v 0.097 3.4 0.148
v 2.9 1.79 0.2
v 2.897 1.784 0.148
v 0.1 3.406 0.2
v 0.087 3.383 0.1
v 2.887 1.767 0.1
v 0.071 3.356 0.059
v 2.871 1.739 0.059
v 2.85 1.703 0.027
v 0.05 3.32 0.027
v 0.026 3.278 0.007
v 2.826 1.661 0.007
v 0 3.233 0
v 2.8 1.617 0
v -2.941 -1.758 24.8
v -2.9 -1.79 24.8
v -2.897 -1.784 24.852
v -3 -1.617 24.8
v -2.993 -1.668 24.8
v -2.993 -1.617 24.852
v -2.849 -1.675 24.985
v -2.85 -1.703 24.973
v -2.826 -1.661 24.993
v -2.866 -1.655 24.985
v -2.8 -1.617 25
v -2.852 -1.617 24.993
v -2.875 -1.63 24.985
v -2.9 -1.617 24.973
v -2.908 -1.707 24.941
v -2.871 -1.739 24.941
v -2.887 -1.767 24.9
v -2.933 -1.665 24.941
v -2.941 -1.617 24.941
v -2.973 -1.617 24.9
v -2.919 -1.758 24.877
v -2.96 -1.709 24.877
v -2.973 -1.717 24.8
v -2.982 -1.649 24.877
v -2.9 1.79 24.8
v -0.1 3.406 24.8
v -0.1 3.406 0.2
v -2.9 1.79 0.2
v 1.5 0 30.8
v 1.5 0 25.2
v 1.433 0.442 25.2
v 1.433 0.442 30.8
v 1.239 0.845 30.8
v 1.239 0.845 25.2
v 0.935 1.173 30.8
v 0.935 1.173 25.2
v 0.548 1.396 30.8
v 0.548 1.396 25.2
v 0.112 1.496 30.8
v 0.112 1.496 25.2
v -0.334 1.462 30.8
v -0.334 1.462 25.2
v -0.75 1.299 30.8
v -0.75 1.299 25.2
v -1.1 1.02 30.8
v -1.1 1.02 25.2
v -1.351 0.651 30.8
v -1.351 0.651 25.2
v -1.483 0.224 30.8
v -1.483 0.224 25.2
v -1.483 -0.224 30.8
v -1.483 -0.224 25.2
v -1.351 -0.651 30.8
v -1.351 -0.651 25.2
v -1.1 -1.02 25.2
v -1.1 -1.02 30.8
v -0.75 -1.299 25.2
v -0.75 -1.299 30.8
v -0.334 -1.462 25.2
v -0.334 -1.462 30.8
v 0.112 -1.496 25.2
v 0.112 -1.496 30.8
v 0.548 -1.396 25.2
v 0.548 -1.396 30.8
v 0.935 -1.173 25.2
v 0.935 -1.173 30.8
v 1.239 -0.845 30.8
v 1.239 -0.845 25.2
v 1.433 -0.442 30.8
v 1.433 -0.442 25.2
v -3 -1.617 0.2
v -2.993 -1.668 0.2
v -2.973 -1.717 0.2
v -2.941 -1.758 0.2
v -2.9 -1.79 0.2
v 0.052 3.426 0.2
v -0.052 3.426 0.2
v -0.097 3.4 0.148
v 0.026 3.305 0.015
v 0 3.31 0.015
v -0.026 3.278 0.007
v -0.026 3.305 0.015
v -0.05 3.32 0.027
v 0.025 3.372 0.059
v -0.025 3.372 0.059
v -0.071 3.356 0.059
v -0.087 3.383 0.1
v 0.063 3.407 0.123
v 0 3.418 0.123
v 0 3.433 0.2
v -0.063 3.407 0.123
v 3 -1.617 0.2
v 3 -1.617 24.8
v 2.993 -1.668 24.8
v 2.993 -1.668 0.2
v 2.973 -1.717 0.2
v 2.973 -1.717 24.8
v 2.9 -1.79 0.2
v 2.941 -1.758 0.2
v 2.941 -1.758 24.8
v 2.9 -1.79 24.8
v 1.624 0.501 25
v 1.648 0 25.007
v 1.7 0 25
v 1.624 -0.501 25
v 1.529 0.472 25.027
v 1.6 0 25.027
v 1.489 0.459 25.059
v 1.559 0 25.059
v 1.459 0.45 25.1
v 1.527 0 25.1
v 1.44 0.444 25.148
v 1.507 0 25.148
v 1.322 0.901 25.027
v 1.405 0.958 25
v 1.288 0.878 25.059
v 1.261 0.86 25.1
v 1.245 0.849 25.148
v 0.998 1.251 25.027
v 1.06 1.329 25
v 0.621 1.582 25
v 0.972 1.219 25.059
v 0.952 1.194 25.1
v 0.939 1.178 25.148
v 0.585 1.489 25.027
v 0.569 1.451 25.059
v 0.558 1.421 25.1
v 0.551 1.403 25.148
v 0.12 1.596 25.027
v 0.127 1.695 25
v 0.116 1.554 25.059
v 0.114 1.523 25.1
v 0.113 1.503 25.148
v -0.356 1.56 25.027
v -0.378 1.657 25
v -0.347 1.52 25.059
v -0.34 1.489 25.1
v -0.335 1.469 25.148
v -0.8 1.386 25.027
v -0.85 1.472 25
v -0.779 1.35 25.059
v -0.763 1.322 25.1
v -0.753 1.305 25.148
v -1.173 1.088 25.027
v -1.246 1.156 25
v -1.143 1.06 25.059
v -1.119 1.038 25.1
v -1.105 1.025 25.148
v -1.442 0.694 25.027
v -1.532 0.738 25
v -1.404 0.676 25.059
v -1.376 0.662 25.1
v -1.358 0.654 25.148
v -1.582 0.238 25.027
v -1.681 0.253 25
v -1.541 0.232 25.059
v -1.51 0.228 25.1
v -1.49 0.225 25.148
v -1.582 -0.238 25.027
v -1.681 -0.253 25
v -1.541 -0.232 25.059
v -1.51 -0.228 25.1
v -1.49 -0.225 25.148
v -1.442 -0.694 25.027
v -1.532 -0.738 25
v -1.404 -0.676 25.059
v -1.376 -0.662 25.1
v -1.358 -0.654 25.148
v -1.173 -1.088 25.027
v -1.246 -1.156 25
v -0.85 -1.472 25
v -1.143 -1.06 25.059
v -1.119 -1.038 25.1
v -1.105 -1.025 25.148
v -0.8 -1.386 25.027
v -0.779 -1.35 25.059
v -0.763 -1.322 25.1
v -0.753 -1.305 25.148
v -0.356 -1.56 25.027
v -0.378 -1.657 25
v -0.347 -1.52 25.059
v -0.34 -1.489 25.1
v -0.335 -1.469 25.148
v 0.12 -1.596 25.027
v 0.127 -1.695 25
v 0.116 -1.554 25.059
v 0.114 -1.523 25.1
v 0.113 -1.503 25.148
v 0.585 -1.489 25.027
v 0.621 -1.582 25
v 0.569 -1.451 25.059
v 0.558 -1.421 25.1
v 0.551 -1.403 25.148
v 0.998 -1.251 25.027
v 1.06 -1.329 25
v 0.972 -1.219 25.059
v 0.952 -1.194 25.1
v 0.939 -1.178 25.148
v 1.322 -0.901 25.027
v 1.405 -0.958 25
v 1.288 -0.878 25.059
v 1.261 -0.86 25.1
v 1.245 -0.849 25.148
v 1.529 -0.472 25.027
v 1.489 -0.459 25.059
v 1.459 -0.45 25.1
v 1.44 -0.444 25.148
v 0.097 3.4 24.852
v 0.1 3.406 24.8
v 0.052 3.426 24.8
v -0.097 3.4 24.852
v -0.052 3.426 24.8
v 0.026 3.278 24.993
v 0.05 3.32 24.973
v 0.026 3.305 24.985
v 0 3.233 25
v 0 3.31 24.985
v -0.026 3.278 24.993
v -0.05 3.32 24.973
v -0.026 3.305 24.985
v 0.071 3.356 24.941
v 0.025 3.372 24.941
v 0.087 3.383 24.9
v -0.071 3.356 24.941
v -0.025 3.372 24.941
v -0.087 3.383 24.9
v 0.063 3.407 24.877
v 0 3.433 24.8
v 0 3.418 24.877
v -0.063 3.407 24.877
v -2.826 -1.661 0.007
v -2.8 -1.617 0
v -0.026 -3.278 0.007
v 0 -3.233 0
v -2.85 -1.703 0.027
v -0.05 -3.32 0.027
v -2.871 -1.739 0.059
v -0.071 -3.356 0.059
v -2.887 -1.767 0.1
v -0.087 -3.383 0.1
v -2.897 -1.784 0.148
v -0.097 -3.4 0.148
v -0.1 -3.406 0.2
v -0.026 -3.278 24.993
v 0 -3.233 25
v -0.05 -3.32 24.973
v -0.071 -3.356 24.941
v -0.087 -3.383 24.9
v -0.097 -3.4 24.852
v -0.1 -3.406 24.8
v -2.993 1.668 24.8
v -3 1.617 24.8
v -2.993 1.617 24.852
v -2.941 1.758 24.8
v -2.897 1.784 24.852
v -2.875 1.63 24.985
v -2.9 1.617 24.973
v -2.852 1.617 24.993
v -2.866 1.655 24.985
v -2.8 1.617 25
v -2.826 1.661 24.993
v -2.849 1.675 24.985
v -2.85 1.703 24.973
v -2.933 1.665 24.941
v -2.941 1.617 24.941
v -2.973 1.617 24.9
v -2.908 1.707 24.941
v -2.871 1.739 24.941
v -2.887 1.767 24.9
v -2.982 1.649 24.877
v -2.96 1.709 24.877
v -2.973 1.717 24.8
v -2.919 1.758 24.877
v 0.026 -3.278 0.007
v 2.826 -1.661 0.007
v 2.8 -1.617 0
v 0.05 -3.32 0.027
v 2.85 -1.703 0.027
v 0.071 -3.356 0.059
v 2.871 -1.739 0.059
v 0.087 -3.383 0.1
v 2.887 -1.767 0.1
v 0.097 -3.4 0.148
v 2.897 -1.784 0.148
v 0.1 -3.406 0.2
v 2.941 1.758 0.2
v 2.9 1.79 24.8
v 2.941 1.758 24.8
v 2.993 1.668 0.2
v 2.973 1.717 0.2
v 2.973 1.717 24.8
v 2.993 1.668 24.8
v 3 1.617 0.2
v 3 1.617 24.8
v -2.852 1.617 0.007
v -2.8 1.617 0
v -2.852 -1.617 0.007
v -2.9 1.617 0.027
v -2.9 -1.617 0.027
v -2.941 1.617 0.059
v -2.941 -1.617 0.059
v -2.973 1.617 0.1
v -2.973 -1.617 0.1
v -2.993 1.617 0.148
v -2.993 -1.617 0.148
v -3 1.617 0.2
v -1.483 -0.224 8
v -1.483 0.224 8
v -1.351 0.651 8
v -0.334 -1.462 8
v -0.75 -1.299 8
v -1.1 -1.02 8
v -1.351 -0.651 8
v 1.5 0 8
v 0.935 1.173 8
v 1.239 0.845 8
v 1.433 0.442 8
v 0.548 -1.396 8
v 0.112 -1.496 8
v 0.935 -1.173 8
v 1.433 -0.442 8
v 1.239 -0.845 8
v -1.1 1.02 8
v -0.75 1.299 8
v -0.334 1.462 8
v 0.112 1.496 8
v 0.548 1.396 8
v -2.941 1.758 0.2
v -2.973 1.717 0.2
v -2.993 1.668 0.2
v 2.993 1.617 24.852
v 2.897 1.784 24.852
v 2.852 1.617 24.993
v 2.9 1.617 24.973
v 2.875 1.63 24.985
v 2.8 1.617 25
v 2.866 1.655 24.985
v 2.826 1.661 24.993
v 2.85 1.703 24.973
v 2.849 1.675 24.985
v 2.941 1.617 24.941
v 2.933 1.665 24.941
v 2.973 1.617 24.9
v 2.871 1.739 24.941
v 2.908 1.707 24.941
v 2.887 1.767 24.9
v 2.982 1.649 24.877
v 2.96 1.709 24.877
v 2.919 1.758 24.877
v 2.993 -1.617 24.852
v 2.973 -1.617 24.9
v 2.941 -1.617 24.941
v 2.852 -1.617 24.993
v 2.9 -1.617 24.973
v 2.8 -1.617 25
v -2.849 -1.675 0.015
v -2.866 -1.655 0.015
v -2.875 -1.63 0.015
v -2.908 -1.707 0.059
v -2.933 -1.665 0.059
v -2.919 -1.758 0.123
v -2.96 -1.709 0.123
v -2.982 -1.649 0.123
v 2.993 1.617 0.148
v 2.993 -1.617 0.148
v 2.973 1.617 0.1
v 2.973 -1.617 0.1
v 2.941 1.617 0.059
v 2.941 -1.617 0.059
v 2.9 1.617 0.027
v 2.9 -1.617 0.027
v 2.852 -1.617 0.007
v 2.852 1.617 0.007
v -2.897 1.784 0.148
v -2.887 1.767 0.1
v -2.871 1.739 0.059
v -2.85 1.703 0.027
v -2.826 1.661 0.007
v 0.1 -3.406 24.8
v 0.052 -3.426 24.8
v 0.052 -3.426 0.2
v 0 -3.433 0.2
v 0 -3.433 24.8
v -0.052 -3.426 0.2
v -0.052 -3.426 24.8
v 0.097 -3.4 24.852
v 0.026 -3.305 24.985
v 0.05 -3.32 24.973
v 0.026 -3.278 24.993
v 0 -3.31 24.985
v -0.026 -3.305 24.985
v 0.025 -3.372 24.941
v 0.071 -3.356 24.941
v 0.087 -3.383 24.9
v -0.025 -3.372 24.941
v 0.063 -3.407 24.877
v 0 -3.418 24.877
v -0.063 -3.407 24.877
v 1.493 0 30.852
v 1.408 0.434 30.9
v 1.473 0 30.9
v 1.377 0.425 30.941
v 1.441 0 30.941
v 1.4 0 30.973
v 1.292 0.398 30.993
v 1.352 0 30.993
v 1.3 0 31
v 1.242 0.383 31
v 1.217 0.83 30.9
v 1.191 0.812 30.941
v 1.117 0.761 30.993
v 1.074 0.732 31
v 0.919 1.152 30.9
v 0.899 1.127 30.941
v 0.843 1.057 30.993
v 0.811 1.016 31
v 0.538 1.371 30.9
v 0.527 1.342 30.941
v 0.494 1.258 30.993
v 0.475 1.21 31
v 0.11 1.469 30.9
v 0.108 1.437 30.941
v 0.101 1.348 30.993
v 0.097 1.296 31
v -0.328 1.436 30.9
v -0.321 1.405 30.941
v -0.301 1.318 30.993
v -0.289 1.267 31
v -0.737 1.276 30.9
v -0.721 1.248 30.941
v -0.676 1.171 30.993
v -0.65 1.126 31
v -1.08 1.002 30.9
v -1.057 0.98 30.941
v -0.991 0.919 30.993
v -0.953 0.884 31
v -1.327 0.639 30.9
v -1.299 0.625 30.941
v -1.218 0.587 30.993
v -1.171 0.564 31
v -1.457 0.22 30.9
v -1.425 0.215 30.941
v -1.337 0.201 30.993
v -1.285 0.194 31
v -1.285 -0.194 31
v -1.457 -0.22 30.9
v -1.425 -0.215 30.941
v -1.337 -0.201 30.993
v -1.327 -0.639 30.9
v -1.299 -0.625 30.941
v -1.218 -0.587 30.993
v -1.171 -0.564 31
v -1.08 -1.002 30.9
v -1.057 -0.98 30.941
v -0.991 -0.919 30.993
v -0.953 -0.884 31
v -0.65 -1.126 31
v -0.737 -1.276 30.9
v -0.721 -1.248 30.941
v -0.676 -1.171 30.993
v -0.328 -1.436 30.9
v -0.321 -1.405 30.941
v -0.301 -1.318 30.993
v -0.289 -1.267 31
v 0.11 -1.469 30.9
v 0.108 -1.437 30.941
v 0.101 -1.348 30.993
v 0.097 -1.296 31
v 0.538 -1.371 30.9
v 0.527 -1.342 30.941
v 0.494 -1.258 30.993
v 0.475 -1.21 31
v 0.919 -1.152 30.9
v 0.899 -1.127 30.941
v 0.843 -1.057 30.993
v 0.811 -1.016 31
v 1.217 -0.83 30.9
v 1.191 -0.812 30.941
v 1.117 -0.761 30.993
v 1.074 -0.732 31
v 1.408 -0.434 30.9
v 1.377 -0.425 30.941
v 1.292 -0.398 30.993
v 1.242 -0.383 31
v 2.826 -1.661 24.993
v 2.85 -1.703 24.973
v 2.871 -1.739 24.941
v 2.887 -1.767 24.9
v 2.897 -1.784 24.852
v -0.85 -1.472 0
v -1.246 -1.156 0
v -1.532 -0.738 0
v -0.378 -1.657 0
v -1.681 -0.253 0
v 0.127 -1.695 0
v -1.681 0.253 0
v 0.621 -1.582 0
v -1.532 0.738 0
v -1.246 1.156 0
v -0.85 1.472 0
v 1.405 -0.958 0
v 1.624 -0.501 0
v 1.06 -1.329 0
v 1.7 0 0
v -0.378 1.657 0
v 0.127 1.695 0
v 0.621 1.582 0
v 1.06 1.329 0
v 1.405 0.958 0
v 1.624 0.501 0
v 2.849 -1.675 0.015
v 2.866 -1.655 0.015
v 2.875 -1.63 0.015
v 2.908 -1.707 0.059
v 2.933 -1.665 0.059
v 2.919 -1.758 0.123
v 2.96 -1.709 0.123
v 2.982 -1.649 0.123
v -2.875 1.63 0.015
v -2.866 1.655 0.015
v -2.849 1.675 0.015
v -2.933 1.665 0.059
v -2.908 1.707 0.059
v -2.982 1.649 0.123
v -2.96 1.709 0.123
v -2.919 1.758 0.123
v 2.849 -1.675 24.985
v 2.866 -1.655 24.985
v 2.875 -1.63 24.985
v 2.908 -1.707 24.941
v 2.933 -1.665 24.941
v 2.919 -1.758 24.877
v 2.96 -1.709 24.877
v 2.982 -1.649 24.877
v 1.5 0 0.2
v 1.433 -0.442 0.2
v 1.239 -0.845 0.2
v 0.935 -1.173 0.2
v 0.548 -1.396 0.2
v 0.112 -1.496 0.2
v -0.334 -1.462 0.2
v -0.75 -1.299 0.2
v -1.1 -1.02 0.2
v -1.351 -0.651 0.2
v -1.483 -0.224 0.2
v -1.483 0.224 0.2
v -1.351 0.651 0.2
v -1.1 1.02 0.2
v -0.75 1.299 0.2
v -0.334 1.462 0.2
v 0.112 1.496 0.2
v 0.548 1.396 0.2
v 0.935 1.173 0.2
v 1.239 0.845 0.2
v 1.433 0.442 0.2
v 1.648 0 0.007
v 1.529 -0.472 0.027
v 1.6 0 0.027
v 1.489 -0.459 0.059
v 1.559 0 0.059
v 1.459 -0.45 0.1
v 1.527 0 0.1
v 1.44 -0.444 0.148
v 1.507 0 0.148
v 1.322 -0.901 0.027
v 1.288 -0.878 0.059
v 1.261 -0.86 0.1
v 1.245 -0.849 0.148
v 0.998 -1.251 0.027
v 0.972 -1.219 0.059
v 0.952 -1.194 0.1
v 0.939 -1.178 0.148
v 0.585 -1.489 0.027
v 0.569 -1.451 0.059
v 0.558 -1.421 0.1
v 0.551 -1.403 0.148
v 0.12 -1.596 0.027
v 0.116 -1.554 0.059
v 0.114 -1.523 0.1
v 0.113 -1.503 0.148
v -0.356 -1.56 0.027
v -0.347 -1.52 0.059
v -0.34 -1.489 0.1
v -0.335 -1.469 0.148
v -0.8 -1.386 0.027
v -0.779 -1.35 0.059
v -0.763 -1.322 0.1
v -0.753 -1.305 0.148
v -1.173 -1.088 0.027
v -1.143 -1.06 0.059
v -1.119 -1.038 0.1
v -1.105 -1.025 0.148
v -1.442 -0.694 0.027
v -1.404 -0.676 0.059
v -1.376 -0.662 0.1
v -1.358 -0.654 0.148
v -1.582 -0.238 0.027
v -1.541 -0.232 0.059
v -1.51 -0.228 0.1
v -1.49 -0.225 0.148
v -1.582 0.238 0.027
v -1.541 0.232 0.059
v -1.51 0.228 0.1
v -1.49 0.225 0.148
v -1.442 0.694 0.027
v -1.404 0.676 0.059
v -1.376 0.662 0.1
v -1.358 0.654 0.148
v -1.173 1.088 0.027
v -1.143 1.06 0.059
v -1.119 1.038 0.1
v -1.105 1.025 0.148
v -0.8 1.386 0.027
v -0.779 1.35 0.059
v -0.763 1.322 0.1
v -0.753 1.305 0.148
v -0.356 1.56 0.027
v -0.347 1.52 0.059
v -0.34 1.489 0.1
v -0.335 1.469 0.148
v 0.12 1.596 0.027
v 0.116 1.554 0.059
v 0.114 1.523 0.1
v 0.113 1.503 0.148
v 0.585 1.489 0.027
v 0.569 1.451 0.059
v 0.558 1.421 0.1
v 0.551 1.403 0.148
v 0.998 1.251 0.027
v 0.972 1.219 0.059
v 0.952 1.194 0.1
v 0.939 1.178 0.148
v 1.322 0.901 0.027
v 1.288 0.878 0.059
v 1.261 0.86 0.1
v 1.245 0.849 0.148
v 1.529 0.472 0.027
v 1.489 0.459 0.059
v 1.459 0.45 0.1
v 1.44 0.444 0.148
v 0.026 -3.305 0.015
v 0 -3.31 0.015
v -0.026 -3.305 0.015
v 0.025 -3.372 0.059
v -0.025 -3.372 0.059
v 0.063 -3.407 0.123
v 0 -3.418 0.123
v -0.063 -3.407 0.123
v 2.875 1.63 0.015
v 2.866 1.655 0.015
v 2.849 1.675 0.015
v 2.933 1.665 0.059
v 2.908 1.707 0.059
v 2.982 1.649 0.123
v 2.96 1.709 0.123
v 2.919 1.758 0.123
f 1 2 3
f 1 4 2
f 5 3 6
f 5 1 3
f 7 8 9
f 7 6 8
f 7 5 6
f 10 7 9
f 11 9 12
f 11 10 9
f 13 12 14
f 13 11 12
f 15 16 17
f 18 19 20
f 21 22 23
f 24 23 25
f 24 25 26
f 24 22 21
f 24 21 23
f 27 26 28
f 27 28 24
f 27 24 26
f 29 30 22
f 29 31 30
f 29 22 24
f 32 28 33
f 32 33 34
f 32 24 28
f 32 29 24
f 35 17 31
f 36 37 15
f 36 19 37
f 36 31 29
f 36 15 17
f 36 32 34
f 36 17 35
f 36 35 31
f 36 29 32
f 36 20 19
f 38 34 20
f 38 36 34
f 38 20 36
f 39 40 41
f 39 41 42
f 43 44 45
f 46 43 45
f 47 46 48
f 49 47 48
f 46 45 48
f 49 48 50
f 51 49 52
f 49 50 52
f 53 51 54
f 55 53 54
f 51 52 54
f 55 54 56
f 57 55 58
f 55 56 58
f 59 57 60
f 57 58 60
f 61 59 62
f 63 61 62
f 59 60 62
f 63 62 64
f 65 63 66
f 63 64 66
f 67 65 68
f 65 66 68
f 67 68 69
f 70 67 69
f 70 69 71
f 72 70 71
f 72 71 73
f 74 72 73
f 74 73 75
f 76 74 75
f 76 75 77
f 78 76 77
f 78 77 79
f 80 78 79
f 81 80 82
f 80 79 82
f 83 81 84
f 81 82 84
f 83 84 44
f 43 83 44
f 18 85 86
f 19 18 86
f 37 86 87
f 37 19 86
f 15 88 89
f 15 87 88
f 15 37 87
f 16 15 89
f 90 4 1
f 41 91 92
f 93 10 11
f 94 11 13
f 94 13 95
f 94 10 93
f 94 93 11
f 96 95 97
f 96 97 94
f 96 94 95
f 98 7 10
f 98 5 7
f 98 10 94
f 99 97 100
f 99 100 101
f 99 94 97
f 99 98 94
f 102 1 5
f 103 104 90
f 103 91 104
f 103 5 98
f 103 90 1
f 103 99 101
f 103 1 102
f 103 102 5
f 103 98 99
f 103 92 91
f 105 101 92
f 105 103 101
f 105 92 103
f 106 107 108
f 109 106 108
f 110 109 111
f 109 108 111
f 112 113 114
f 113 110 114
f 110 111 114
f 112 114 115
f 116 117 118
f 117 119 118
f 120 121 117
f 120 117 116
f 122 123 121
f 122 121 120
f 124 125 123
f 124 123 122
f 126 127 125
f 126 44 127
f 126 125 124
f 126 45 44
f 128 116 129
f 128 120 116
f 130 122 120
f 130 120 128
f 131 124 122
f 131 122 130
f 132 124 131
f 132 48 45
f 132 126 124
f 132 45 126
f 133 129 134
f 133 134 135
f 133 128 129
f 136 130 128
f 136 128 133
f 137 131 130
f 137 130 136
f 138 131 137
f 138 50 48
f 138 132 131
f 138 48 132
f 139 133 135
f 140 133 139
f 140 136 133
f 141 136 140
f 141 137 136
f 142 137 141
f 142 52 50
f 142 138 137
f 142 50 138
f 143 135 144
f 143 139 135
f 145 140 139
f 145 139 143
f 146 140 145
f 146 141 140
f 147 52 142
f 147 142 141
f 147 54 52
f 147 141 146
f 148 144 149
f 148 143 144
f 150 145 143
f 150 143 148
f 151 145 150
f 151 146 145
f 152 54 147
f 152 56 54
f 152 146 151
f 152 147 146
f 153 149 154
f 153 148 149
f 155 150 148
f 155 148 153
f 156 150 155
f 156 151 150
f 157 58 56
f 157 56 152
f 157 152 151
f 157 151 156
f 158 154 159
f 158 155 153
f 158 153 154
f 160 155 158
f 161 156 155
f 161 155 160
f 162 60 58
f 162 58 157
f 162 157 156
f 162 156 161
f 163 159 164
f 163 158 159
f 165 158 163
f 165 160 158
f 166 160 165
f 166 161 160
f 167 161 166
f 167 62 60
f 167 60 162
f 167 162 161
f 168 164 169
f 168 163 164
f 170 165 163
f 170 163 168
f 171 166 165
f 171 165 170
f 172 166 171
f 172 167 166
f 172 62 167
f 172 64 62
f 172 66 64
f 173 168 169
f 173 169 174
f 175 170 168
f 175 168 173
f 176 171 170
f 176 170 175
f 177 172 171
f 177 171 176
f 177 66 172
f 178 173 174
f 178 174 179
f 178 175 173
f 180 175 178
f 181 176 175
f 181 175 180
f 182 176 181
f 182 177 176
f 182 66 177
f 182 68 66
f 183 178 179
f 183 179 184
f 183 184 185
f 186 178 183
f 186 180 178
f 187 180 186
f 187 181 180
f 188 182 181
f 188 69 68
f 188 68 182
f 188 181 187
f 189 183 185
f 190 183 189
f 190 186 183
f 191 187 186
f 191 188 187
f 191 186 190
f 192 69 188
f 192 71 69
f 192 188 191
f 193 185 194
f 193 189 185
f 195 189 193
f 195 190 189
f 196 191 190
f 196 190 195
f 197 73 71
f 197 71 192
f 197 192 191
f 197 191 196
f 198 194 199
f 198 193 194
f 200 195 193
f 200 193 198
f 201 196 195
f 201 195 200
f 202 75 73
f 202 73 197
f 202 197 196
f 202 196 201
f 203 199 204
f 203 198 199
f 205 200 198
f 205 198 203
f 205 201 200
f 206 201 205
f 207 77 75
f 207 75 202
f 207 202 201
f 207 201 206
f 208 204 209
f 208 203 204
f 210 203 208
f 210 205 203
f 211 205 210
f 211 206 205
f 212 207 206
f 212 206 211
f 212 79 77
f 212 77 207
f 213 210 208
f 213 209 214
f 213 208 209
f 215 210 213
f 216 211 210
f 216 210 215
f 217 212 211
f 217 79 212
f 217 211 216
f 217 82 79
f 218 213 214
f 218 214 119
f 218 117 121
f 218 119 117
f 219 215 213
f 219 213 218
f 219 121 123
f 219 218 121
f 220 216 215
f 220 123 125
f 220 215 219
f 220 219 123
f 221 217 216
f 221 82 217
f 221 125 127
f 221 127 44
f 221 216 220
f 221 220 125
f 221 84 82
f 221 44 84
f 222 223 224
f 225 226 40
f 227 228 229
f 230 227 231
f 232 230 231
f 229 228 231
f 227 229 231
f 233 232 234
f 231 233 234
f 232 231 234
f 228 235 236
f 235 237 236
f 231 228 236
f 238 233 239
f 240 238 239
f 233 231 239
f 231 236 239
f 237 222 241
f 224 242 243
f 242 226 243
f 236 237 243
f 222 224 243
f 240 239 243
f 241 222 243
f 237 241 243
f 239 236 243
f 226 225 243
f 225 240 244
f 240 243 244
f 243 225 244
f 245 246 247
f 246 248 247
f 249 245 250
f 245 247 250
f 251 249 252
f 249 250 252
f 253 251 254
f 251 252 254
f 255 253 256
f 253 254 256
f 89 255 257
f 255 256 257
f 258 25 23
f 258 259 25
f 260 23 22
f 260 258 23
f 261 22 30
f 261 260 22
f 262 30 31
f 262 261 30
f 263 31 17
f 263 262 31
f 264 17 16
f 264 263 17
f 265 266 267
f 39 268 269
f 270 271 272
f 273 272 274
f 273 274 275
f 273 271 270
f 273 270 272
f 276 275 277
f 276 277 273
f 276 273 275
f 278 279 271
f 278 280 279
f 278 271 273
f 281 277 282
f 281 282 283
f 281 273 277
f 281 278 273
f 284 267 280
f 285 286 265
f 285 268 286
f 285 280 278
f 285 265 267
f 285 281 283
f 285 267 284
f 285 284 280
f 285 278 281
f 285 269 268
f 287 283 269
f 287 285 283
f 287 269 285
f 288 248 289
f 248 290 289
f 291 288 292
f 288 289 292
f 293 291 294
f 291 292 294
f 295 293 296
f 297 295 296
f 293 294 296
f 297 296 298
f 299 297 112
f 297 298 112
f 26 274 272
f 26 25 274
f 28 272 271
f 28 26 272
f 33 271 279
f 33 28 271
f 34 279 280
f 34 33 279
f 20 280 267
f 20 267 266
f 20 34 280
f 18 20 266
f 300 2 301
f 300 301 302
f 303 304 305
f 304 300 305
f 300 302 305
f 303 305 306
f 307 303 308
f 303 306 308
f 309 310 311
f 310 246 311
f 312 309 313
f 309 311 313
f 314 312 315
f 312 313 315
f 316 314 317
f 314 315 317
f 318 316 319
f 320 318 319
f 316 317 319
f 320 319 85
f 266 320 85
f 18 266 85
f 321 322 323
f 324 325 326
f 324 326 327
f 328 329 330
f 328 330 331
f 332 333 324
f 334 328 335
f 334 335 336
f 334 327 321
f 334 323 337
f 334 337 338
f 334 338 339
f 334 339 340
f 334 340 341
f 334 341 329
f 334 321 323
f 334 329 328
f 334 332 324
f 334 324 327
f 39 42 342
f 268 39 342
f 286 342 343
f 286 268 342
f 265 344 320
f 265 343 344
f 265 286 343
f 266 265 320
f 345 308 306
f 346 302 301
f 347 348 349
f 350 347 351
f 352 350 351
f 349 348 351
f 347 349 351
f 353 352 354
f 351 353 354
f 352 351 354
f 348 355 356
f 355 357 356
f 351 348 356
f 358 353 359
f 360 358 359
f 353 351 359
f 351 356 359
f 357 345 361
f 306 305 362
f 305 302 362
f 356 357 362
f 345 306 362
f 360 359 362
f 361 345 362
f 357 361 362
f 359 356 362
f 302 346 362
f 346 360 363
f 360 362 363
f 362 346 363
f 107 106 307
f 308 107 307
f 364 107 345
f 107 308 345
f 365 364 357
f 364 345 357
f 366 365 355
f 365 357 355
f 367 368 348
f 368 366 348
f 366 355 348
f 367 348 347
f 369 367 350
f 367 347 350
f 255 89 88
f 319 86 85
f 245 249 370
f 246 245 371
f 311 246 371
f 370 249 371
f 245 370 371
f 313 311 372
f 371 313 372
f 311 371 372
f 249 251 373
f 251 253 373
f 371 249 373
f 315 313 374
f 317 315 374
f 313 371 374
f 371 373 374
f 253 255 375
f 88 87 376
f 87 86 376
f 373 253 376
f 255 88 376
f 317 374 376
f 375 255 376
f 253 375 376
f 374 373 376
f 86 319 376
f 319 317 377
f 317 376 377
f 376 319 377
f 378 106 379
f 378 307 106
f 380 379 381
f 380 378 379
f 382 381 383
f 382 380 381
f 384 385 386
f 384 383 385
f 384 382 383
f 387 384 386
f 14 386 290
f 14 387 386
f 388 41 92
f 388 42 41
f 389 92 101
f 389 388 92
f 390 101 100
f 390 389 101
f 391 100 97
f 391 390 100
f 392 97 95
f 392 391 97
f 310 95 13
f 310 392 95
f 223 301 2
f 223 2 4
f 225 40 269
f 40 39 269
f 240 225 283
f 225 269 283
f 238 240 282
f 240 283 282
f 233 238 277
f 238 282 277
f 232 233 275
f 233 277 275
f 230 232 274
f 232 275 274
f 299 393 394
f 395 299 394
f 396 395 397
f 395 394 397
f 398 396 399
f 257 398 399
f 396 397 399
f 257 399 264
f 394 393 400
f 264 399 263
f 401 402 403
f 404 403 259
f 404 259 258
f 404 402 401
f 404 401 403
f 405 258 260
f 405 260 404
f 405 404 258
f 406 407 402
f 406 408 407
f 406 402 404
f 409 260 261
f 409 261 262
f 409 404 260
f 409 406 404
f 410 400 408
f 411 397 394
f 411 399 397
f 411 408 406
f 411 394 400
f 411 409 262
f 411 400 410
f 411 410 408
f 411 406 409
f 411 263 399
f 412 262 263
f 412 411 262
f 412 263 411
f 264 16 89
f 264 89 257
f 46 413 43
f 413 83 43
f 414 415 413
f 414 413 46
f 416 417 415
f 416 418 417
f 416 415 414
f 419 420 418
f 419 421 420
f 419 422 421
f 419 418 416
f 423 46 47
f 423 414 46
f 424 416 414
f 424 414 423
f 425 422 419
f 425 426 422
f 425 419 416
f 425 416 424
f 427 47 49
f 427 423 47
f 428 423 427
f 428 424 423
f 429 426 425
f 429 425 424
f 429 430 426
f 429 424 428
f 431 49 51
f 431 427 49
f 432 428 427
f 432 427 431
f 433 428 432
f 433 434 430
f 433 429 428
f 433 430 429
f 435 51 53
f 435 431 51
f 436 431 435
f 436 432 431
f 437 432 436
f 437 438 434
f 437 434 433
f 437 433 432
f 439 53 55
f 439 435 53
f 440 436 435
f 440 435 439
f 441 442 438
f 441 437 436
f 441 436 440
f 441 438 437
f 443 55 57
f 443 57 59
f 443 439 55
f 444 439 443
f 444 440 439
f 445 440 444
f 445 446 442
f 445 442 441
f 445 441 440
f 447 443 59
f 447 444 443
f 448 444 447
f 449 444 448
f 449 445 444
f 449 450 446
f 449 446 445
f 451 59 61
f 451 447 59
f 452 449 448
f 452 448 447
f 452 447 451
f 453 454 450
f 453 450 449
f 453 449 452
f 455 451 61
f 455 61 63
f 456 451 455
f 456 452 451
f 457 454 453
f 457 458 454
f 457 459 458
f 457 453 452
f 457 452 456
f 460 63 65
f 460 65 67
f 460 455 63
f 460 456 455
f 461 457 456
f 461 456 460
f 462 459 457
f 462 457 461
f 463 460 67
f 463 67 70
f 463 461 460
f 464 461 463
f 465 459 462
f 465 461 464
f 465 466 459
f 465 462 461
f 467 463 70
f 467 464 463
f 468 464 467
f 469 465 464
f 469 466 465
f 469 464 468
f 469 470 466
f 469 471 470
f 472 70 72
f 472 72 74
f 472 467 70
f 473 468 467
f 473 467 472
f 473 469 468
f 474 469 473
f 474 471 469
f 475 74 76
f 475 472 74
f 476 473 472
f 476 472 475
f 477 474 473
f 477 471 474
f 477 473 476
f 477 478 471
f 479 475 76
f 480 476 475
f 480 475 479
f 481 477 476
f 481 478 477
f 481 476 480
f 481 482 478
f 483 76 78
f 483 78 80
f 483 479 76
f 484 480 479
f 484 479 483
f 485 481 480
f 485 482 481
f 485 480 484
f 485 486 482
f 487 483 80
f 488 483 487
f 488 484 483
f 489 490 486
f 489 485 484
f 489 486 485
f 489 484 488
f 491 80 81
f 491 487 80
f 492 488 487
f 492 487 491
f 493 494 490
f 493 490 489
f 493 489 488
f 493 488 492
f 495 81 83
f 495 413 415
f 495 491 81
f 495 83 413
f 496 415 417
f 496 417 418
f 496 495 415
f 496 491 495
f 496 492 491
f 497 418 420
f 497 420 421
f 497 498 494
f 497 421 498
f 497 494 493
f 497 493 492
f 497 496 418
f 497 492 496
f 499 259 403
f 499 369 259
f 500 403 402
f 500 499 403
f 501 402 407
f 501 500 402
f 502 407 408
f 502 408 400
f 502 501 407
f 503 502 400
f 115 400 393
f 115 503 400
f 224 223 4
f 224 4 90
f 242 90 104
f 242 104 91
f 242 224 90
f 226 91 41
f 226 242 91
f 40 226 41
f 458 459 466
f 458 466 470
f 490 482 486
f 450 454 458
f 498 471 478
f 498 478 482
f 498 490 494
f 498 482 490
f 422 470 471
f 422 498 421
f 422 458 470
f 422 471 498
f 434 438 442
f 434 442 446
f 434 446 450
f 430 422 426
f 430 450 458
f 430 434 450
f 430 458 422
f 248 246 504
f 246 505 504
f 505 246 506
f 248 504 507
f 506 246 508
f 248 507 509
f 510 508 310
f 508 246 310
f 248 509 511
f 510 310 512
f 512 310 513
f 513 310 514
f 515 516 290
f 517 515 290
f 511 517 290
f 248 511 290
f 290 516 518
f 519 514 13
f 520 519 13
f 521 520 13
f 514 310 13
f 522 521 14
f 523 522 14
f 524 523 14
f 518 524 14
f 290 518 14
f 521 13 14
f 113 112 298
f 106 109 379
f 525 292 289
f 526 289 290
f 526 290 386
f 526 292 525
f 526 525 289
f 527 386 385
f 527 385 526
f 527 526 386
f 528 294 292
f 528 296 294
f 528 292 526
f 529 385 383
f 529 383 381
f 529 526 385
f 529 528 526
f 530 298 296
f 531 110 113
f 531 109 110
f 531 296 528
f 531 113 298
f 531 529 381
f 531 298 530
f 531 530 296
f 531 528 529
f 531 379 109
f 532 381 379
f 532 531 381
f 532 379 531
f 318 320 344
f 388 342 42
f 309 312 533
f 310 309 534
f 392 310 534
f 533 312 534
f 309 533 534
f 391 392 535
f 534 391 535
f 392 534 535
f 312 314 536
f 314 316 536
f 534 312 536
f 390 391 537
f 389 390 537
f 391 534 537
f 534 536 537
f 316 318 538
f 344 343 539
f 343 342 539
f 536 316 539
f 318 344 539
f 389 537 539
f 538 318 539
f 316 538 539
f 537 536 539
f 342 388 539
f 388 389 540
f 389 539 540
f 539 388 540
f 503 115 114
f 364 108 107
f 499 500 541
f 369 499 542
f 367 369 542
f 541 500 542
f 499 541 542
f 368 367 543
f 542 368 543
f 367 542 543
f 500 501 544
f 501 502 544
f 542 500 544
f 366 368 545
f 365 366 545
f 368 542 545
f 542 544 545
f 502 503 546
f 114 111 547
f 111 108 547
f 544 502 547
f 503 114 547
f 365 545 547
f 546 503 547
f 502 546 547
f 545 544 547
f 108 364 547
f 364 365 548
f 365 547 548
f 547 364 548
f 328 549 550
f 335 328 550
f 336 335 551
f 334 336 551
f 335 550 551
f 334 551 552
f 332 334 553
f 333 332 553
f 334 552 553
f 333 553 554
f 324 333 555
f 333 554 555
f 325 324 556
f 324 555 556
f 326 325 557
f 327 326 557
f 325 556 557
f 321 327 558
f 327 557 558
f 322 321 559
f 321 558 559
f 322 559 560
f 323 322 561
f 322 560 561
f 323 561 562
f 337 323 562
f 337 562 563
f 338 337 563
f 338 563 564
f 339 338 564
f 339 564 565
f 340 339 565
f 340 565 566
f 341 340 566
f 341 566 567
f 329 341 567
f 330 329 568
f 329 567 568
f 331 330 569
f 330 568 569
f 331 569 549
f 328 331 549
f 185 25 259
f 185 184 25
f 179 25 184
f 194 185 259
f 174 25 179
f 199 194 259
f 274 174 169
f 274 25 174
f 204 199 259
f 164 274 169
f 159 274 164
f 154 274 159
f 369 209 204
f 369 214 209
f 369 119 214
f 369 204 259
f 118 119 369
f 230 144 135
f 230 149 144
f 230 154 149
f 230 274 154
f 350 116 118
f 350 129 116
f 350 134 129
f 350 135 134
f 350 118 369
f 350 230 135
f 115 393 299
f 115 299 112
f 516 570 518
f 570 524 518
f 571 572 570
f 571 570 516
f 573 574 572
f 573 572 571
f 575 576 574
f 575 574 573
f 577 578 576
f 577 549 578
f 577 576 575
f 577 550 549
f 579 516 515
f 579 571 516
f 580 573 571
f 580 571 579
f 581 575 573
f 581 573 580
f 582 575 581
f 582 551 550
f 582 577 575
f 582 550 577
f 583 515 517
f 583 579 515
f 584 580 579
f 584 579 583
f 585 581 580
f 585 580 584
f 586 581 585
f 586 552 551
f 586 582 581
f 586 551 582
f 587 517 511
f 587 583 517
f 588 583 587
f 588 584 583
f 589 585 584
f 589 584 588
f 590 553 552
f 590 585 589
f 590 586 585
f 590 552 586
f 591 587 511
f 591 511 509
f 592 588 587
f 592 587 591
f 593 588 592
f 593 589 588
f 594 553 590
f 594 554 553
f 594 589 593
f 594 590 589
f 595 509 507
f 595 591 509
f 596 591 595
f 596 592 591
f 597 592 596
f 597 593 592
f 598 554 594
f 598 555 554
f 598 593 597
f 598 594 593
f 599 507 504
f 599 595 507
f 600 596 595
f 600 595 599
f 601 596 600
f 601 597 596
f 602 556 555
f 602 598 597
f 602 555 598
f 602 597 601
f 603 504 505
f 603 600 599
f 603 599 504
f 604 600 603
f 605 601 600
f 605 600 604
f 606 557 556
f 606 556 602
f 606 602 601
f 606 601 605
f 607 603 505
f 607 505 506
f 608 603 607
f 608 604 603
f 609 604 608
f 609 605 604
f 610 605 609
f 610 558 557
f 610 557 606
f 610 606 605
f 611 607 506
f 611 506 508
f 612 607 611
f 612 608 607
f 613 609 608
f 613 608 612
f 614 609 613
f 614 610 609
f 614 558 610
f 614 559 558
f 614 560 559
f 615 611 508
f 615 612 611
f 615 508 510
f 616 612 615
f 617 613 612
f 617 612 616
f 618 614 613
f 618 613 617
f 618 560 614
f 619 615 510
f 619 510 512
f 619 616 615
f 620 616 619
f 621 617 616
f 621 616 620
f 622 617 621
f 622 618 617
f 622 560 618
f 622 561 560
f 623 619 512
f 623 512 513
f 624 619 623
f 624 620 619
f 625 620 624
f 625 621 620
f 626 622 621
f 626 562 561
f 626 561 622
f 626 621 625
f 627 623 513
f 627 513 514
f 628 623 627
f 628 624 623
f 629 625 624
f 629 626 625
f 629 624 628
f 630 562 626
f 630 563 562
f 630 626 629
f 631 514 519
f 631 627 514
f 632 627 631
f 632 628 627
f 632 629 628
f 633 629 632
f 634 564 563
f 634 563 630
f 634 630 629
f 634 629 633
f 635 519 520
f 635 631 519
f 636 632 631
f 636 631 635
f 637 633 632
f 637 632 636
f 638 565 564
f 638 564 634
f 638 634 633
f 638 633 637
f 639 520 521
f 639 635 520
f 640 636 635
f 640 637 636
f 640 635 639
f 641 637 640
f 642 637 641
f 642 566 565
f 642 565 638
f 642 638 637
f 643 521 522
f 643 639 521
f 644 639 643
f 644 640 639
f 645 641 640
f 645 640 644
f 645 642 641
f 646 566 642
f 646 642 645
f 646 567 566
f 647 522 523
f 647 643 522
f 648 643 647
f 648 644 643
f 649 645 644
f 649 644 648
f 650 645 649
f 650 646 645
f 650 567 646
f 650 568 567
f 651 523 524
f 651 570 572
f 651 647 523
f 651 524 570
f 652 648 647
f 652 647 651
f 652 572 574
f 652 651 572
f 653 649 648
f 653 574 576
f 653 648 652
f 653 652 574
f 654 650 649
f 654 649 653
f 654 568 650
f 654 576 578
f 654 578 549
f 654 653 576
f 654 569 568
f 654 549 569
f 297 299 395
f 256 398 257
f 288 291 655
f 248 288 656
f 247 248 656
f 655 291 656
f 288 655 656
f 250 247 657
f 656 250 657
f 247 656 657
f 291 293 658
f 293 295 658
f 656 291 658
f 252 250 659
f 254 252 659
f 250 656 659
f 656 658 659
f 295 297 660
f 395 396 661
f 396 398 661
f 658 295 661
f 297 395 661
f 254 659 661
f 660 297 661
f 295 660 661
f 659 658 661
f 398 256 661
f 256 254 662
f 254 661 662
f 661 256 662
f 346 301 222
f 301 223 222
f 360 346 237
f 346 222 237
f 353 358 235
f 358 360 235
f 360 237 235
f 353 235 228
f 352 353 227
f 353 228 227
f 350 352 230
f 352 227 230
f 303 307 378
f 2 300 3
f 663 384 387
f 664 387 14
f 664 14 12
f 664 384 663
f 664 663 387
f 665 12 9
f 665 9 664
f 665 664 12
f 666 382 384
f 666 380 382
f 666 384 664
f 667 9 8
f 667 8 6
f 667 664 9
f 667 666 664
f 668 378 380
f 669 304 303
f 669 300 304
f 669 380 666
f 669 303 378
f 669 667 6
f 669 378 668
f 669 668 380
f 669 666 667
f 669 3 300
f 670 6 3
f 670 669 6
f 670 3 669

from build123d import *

# Parameters (mm, degrees)
F1_DEPTH = 25
F2_R     = 1.5
F3_DEPTH = 6
F4_R     = 1.5
F5_DEPTH = 8
F6_R     = 0.2


with BuildPart() as f1:
    # F0 (on Top) → F1 (new body)
    with BuildSketch(Plane.XY):
        Polygon((3, 1.7320508076), (0, 3.4641016151), (-3, 1.7320508076), (-3, -1.7320508076), (0, -3.4641016151), (3, -1.7320508076), align=None)
    extrude(amount=F1_DEPTH)

    # F2 (on face) → F3 (join)
    with BuildSketch(Plane.XY.offset(25)):
        Circle(F2_R)
    extrude(amount=F3_DEPTH)

    # F4 (on face) → F5 (cut)
    with BuildSketch(Plane(origin=(0, 0, 0), x_dir=(1, 0, 0), z_dir=(0, 0, -1))):
        Circle(F4_R)
    extrude(amount=-F5_DEPTH, mode=Mode.SUBTRACT)

    # F6
    f6_edges = [f1.edges().sort_by_distance(p)[0] for p in [
        (1.5, -2.598076, 0),
        (-1.5, -2.598076, 0),
        (3, 0, 0),
        (-3, 0, 0),
        (1.5, 2.598076, 0),
        (-1.5, 2.598076, 0),
        (-1.5, 0, 0),
        (1.5, -2.598076, 25),
        (-1.5, -2.598076, 25),
        (3, 0, 25),
        (-3, 0, 25),
        (1.5, 2.598076, 25),
        (-1.5, 2.598076, 25),
        (-1.5, 0, 25),
        (-1.5, 0, 31),
        (-3, -1.732051, 12.5),
        (0, -3.464102, 12.5),
        (-3, 1.732051, 12.5),
        (0, 3.464102, 12.5),
        (3, 1.732051, 12.5),
        (3, -1.732051, 12.5),
    ]]
    fillet(f6_edges, radius=F6_R)


solid = f1.part
